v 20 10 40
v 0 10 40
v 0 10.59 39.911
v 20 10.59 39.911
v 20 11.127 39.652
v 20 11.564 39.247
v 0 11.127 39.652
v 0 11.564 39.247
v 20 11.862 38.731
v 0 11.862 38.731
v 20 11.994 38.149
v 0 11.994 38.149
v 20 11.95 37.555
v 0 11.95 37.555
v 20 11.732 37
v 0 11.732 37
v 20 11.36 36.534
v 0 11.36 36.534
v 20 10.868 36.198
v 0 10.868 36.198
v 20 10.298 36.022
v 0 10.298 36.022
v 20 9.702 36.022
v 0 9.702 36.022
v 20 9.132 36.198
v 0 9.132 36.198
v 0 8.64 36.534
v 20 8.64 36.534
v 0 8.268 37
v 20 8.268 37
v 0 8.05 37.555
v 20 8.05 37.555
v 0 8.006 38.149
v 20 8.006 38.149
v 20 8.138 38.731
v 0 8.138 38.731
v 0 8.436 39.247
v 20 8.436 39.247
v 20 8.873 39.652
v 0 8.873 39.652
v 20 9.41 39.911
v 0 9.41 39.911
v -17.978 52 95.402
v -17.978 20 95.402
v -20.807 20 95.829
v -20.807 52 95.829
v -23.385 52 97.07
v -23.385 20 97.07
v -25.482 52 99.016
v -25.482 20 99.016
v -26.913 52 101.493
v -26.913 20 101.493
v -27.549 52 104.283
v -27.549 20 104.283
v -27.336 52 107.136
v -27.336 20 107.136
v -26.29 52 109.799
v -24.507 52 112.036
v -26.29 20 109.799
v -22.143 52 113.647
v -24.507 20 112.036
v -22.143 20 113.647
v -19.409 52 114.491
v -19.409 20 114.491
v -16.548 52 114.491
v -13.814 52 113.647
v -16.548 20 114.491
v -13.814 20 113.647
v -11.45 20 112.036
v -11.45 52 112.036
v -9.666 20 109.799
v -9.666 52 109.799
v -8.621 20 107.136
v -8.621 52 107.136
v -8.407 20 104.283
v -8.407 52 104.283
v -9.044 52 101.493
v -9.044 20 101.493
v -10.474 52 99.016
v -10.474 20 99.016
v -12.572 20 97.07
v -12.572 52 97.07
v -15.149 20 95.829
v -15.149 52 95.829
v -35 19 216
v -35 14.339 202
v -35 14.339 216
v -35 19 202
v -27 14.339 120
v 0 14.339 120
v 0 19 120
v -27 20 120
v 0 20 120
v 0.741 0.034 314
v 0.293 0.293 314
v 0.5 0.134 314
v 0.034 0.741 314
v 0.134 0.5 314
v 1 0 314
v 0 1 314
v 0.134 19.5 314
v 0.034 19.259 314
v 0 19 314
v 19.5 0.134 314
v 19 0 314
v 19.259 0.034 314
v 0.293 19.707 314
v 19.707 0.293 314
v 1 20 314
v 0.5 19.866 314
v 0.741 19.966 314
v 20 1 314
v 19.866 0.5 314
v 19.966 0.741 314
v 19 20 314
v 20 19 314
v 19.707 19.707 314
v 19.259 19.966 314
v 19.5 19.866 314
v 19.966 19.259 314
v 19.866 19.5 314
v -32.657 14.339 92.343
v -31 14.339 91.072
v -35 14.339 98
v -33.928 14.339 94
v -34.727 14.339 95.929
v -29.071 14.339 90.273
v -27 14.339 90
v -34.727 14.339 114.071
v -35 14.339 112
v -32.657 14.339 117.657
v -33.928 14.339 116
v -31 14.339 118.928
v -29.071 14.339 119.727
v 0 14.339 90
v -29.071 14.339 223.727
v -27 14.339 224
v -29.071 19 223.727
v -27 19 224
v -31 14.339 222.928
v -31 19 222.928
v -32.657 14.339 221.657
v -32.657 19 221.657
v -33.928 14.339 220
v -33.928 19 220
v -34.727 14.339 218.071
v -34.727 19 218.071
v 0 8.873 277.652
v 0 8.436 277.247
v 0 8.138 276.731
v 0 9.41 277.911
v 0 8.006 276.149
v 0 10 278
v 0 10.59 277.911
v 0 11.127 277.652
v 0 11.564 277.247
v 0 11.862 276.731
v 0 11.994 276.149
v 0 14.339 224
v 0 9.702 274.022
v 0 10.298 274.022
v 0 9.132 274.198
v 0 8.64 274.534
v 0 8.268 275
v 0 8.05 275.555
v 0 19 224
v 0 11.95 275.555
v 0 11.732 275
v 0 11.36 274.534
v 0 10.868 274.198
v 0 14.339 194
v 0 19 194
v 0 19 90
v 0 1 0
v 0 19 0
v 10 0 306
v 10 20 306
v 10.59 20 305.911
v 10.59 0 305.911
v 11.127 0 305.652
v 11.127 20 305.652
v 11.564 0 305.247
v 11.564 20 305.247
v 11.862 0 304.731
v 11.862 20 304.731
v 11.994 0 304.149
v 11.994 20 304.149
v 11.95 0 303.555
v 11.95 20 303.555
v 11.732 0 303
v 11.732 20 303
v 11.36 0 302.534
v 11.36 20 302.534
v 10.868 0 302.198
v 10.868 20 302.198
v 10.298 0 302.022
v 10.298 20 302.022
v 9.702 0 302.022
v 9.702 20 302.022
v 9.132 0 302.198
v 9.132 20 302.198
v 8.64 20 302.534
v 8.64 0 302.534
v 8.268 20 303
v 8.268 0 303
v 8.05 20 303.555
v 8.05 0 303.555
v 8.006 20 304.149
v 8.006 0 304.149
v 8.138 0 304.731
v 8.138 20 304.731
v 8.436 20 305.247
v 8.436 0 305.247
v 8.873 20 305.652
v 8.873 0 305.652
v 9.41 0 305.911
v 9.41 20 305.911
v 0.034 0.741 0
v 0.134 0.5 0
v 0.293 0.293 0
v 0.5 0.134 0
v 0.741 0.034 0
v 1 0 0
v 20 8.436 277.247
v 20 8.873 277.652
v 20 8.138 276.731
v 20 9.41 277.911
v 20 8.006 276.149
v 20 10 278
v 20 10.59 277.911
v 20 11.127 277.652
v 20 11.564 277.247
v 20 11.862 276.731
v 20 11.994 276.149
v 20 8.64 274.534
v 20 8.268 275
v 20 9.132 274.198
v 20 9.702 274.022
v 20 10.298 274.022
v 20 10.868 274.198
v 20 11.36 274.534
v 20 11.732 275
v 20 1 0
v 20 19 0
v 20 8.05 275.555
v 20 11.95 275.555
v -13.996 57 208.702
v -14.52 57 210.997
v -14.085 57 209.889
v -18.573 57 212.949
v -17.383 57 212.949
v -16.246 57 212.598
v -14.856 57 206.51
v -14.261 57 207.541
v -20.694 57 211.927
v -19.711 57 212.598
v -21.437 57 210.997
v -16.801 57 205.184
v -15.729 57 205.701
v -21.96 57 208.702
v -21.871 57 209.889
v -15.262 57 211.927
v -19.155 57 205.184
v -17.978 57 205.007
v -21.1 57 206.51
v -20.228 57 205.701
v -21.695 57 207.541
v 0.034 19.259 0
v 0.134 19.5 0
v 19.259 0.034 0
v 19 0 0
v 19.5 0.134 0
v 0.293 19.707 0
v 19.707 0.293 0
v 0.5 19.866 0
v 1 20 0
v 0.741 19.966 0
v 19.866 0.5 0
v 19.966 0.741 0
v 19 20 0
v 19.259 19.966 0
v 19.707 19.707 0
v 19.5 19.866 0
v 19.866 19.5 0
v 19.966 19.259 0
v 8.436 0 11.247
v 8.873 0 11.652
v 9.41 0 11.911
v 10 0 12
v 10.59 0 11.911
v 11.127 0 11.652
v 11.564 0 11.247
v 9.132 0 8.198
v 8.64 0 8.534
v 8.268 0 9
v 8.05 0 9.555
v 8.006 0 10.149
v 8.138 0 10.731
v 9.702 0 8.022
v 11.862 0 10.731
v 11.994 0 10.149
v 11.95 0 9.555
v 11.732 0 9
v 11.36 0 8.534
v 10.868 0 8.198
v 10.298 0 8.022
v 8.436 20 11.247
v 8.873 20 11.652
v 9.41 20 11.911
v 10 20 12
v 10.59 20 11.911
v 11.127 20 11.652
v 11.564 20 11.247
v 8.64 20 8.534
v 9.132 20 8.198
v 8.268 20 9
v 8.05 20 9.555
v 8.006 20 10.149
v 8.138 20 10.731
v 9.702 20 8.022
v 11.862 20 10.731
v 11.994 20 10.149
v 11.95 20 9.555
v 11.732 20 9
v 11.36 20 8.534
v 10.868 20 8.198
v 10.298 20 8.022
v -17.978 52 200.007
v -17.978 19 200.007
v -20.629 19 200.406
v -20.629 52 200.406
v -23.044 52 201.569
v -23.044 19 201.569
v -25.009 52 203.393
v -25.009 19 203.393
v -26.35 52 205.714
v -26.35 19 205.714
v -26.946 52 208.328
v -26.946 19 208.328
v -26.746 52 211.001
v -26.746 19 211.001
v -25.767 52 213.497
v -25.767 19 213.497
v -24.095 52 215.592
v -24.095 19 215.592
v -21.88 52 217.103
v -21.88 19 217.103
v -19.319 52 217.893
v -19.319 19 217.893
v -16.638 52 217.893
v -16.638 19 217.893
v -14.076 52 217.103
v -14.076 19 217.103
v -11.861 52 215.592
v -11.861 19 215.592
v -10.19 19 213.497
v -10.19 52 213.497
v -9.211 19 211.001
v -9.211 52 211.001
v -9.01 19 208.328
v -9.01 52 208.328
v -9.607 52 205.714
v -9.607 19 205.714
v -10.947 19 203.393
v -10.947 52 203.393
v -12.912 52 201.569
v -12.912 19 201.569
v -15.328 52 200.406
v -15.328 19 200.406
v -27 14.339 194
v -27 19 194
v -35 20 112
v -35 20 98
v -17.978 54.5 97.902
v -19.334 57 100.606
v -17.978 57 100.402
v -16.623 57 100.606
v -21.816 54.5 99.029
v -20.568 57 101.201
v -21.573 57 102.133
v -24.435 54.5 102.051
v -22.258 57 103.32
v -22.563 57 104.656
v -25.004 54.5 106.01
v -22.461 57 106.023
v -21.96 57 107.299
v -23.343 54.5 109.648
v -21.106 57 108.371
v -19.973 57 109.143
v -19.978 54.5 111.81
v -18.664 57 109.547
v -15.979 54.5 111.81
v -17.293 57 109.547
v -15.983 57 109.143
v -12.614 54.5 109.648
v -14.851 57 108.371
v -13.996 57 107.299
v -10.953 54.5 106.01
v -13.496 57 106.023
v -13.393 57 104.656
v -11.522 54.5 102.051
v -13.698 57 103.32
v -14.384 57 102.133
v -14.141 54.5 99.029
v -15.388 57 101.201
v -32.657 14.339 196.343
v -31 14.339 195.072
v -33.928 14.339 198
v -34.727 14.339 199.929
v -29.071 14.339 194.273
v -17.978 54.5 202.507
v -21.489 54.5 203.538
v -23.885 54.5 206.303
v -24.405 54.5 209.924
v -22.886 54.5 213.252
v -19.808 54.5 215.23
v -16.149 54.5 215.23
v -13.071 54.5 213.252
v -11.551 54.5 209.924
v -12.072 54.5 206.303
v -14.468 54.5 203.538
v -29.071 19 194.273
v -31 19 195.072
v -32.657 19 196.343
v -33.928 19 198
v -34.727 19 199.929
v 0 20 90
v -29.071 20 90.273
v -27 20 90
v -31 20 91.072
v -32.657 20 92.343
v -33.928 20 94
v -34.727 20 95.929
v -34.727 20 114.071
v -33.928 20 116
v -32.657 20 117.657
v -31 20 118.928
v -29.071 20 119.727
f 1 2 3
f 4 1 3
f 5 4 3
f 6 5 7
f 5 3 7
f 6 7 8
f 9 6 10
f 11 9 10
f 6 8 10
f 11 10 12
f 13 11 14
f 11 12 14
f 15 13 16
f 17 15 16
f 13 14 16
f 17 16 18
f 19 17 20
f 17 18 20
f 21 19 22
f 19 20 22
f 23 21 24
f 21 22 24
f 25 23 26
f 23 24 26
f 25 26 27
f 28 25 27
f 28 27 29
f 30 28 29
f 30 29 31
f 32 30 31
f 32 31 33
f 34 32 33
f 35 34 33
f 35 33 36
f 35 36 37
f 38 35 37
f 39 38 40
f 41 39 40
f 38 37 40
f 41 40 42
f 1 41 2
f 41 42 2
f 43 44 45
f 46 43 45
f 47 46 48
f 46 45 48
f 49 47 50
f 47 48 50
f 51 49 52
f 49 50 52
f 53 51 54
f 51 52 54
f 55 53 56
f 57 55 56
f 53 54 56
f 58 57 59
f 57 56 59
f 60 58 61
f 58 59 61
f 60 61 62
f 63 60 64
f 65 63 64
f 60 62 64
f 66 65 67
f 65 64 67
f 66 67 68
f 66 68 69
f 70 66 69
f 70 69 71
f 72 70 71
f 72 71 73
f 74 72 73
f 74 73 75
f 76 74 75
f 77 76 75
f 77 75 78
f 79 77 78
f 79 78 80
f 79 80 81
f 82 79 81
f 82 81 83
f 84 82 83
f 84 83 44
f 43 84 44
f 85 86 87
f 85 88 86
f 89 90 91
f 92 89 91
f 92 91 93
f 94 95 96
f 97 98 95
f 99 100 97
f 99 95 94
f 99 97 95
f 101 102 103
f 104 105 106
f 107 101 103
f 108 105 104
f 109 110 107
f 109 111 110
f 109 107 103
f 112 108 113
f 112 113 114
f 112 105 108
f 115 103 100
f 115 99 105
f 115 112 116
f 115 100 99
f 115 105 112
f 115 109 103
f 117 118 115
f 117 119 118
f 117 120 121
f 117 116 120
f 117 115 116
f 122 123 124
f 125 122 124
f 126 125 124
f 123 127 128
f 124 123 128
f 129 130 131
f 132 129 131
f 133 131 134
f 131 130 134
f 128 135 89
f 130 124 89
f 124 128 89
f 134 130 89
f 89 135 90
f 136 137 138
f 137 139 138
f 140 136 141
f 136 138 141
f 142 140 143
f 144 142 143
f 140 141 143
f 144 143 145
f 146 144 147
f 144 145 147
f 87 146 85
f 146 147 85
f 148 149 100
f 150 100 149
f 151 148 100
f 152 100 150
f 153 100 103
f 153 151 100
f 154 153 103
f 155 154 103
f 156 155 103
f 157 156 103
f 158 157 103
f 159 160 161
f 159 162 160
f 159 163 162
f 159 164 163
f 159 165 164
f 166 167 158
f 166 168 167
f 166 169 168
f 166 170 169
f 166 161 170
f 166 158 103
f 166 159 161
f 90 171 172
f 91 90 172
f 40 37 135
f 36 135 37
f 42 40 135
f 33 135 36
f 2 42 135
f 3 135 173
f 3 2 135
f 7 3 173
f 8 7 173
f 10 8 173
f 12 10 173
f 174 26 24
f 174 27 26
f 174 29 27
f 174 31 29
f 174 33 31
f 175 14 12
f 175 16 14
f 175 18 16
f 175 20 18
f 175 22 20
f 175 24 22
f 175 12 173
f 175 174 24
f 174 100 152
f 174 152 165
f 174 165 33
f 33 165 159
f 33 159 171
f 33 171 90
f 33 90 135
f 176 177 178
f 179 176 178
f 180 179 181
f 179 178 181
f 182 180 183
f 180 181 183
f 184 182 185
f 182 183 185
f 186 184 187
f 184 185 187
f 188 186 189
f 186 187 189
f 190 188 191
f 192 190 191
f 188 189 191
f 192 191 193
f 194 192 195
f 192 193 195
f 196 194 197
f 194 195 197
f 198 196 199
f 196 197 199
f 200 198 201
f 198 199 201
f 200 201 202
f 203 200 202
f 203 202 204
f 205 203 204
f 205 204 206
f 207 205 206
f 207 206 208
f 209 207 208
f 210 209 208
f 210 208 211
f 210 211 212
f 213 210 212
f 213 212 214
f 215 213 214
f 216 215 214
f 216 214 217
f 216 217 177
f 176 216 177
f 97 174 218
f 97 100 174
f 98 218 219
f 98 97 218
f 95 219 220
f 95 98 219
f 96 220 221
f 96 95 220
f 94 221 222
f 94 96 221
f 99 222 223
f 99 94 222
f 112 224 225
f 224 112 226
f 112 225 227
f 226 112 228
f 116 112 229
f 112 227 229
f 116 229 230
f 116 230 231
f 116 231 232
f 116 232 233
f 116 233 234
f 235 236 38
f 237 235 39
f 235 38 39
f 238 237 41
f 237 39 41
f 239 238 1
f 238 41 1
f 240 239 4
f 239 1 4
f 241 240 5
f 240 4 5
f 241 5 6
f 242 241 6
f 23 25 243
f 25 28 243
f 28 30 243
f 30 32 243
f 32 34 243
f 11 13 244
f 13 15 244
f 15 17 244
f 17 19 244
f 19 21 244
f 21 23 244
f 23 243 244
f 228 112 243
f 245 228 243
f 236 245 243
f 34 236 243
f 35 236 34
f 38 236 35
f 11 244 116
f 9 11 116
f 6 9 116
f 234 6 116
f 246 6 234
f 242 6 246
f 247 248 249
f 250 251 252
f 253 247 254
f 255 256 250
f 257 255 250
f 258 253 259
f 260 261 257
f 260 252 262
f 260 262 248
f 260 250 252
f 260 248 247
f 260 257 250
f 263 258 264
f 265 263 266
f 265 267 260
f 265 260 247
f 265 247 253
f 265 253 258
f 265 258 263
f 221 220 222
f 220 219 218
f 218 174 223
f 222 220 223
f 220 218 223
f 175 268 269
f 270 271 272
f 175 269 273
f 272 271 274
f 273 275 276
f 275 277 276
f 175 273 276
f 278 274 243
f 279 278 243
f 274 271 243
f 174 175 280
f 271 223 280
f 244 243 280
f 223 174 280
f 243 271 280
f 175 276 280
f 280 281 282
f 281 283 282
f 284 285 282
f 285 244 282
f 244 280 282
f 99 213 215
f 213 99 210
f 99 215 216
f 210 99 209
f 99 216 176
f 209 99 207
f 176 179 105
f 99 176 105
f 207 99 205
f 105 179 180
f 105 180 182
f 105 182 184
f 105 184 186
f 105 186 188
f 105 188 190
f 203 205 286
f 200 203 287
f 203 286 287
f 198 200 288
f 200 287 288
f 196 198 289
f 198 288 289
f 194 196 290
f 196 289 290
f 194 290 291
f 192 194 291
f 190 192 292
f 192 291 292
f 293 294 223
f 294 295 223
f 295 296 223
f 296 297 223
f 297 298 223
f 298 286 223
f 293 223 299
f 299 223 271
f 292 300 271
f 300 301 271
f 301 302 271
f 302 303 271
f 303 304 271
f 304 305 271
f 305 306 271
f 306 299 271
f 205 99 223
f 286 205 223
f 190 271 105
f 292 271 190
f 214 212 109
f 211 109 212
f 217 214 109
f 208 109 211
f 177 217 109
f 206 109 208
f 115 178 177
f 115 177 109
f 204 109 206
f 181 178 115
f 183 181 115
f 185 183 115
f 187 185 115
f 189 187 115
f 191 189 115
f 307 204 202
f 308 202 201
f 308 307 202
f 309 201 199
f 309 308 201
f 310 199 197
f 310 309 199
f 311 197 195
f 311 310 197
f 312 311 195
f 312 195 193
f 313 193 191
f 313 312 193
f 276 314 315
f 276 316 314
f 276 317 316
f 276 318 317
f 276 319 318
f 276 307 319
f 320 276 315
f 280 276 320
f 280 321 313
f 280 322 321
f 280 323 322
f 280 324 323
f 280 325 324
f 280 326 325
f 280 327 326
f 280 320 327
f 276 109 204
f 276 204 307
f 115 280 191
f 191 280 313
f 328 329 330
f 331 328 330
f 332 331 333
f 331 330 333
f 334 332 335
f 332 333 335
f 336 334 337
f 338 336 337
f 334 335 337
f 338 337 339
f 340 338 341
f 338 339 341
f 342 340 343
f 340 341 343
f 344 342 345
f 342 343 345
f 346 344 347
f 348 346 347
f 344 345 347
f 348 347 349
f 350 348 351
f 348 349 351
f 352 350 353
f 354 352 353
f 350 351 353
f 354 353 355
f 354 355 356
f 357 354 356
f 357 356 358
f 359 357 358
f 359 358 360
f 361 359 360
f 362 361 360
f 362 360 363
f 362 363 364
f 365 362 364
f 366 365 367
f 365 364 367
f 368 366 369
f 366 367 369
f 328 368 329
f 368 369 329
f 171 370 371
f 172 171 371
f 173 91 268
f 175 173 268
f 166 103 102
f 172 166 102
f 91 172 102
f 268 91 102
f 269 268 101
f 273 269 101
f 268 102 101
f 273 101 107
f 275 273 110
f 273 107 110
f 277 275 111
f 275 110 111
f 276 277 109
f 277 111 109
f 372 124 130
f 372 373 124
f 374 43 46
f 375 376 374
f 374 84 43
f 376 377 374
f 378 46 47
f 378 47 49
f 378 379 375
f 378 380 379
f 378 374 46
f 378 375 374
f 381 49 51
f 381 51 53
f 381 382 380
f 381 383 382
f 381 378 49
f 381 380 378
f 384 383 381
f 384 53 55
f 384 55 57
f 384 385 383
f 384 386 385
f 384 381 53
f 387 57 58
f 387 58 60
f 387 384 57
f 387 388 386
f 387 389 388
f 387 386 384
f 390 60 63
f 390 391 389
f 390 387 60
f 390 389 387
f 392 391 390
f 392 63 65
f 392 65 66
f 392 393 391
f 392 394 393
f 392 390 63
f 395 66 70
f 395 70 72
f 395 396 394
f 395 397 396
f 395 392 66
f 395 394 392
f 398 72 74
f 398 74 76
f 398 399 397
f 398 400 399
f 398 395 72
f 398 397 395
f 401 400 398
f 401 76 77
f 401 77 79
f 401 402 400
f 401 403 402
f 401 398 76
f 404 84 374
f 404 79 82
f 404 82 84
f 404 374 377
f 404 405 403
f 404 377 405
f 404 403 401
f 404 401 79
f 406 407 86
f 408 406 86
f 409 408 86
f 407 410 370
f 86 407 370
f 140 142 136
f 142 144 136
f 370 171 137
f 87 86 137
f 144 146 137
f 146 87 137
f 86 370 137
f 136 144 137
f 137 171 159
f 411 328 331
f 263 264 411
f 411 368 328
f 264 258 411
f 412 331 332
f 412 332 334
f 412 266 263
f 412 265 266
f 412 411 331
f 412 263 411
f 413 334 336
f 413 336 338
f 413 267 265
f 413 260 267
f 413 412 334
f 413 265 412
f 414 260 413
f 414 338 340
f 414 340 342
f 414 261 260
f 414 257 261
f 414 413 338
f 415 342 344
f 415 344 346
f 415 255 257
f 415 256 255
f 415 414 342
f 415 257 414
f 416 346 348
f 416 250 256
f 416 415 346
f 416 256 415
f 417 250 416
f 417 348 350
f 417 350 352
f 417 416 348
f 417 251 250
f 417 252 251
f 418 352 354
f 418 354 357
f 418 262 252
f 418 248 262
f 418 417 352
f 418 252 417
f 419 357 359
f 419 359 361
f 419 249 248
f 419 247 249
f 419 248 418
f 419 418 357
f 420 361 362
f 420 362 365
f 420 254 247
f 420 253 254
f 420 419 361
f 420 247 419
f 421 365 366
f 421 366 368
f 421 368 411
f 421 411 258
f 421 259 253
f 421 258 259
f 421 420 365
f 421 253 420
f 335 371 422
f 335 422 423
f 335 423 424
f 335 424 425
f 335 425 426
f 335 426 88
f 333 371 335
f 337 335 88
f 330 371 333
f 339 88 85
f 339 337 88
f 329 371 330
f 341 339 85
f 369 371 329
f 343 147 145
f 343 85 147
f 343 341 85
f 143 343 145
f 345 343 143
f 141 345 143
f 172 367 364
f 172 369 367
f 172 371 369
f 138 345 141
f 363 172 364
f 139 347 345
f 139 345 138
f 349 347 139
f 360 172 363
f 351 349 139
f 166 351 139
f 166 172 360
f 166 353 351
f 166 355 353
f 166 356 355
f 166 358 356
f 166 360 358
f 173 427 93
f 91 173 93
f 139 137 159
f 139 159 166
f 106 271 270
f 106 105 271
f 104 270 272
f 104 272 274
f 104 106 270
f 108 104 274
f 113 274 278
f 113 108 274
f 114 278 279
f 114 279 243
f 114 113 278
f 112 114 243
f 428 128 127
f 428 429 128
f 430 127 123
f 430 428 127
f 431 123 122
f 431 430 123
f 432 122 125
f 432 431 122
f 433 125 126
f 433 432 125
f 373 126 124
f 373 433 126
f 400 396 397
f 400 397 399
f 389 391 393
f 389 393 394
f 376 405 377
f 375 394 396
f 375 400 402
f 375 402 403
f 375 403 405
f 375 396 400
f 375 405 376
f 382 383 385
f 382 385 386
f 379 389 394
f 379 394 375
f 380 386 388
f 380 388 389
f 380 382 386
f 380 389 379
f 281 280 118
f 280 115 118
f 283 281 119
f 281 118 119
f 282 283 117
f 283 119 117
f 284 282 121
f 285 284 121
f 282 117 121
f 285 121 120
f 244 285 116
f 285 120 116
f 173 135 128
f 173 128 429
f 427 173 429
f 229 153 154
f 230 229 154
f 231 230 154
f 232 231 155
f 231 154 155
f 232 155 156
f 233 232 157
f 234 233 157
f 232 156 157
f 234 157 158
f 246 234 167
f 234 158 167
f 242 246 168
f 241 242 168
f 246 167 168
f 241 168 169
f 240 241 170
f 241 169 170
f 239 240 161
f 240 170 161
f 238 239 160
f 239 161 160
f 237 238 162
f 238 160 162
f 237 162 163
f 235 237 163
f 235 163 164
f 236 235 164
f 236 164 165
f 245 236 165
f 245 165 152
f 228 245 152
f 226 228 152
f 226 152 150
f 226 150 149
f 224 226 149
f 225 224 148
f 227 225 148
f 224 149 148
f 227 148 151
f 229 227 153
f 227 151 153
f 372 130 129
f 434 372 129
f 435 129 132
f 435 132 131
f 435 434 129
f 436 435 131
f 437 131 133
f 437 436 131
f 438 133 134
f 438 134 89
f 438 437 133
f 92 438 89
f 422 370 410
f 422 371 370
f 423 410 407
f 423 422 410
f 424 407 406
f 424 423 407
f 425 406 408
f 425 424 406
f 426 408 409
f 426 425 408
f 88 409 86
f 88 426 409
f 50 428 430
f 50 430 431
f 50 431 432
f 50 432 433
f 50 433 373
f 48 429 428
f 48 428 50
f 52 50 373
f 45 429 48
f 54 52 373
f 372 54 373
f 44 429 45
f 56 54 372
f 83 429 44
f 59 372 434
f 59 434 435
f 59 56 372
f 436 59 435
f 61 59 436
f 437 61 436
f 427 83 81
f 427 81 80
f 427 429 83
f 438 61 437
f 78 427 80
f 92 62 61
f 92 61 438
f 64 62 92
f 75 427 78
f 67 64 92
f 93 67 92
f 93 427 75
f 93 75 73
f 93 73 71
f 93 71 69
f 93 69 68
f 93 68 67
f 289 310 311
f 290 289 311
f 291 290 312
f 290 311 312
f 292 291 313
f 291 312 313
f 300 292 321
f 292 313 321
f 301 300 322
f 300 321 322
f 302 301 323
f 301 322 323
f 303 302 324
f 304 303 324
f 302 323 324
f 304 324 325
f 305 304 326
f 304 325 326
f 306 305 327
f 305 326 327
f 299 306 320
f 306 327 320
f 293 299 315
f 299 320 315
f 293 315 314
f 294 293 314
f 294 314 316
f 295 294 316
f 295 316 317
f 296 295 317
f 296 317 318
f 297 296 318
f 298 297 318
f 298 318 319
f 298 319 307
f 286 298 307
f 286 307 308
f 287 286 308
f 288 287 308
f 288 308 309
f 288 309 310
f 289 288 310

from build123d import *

# Parameters (mm, degrees)
SKETCH_1_W          = 20
SKETCH_1_H          = 20
EXTRUDE_1_DEPTH     = 314
SKETCH_2_R          = 2
CUT_EXTRUDE_1_DEPTH = 314
FILLET_1_R          = 1
SKETCH_3_R          = 2
CUT_EXTRUDE_2_DEPTH = 20
SKETCH_4_W          = 30
SKETCH_4_H          = 5.661352718
SKETCH_4_H_2        = 4.661352718
EXTRUDE_2_DEPTH     = 35
SKETCH_5_R          = 8.993195823
SKETCH_5_R_2        = 9.597903515
EXTRUDE_3_DEPTH     = 38
FILLET_2_R          = 8
CHAMFER_1_SIZE      = 5


with BuildPart() as part:
    # 草图1 → 凸台-拉伸1 (new body)
    with BuildSketch(Plane.XY):
        with Locations((10, 10)):
            Rectangle(SKETCH_1_W, SKETCH_1_H)
    extrude(amount=EXTRUDE_1_DEPTH)

    # 草图2 → 切除-拉伸1 (cut)
    with BuildSketch(Plane(origin=(0, 20, 0), x_dir=(1, 0, 0), z_dir=(0, 1, 0))):
        with Locations(Location((10, -10, 0), (0, 0, 270))):
            Circle(SKETCH_2_R)
        with Locations(Location((10, -304, 0), (0, 0, 270))):
            Circle(SKETCH_2_R)
    extrude(amount=-CUT_EXTRUDE_1_DEPTH, mode=Mode.SUBTRACT)

    # 圆角1
    fillet_1_edges = [part.edges().sort_by_distance(p)[0] for p in [
        (0, 20, 157),
        (20, 20, 157),
        (20, 0, 157),
        (0, 0, 157),
    ]]
    fillet(fillet_1_edges, radius=FILLET_1_R)

    # 草图3 → 切除-拉伸2 (cut)
    with BuildSketch(Plane.ZY):
        with Locations((276, 10)):
            Circle(SKETCH_3_R)
        with Locations((38, 10)):
            Circle(SKETCH_3_R)
    extrude(amount=-CUT_EXTRUDE_2_DEPTH, mode=Mode.SUBTRACT)

    # 草图4 → 凸台-拉伸2 (add)
    with BuildSketch(Plane.ZY):
        with Locations((105, 17.169323641)):
            Rectangle(SKETCH_4_W, SKETCH_4_H)
        with Locations((209, 16.669323641)):
            Rectangle(SKETCH_4_W, SKETCH_4_H_2)
    extrude(amount=EXTRUDE_2_DEPTH)

    # 草图5 → 凸台-拉伸3 (add)
    with BuildSketch(Plane(origin=(0, 19, 0), x_dir=(1, 0, 0), z_dir=(0, 1, 0))):
        with Locations(Location((-17.978292209, -209, 0), (0, 0, 90))):
            Circle(SKETCH_5_R)
        with Locations(Location((-17.978292209, -105, 0), (0, 0, 90))):
            Circle(SKETCH_5_R_2)
    extrude(amount=EXTRUDE_3_DEPTH)

    # 圆角2
    fillet_2_edges = [part.edges().sort_by_distance(p)[0] for p in [
        (-35, 17.169323641, 90),
        (-35, 17.169323641, 120),
        (-35, 16.669323641, 224),
        (-35, 16.669323641, 194),
    ]]
    fillet(fillet_2_edges, radius=FILLET_2_R)

    # 倒角1
    chamfer_1_edges = [part.edges().sort_by_distance(p)[0] for p in [
        (-17.978292209, 57, 217.993195823),
        (-17.978292209, 57, 114.597903515),
    ]]
    chamfer(chamfer_1_edges, length=CHAMFER_1_SIZE)


solid = part.part
